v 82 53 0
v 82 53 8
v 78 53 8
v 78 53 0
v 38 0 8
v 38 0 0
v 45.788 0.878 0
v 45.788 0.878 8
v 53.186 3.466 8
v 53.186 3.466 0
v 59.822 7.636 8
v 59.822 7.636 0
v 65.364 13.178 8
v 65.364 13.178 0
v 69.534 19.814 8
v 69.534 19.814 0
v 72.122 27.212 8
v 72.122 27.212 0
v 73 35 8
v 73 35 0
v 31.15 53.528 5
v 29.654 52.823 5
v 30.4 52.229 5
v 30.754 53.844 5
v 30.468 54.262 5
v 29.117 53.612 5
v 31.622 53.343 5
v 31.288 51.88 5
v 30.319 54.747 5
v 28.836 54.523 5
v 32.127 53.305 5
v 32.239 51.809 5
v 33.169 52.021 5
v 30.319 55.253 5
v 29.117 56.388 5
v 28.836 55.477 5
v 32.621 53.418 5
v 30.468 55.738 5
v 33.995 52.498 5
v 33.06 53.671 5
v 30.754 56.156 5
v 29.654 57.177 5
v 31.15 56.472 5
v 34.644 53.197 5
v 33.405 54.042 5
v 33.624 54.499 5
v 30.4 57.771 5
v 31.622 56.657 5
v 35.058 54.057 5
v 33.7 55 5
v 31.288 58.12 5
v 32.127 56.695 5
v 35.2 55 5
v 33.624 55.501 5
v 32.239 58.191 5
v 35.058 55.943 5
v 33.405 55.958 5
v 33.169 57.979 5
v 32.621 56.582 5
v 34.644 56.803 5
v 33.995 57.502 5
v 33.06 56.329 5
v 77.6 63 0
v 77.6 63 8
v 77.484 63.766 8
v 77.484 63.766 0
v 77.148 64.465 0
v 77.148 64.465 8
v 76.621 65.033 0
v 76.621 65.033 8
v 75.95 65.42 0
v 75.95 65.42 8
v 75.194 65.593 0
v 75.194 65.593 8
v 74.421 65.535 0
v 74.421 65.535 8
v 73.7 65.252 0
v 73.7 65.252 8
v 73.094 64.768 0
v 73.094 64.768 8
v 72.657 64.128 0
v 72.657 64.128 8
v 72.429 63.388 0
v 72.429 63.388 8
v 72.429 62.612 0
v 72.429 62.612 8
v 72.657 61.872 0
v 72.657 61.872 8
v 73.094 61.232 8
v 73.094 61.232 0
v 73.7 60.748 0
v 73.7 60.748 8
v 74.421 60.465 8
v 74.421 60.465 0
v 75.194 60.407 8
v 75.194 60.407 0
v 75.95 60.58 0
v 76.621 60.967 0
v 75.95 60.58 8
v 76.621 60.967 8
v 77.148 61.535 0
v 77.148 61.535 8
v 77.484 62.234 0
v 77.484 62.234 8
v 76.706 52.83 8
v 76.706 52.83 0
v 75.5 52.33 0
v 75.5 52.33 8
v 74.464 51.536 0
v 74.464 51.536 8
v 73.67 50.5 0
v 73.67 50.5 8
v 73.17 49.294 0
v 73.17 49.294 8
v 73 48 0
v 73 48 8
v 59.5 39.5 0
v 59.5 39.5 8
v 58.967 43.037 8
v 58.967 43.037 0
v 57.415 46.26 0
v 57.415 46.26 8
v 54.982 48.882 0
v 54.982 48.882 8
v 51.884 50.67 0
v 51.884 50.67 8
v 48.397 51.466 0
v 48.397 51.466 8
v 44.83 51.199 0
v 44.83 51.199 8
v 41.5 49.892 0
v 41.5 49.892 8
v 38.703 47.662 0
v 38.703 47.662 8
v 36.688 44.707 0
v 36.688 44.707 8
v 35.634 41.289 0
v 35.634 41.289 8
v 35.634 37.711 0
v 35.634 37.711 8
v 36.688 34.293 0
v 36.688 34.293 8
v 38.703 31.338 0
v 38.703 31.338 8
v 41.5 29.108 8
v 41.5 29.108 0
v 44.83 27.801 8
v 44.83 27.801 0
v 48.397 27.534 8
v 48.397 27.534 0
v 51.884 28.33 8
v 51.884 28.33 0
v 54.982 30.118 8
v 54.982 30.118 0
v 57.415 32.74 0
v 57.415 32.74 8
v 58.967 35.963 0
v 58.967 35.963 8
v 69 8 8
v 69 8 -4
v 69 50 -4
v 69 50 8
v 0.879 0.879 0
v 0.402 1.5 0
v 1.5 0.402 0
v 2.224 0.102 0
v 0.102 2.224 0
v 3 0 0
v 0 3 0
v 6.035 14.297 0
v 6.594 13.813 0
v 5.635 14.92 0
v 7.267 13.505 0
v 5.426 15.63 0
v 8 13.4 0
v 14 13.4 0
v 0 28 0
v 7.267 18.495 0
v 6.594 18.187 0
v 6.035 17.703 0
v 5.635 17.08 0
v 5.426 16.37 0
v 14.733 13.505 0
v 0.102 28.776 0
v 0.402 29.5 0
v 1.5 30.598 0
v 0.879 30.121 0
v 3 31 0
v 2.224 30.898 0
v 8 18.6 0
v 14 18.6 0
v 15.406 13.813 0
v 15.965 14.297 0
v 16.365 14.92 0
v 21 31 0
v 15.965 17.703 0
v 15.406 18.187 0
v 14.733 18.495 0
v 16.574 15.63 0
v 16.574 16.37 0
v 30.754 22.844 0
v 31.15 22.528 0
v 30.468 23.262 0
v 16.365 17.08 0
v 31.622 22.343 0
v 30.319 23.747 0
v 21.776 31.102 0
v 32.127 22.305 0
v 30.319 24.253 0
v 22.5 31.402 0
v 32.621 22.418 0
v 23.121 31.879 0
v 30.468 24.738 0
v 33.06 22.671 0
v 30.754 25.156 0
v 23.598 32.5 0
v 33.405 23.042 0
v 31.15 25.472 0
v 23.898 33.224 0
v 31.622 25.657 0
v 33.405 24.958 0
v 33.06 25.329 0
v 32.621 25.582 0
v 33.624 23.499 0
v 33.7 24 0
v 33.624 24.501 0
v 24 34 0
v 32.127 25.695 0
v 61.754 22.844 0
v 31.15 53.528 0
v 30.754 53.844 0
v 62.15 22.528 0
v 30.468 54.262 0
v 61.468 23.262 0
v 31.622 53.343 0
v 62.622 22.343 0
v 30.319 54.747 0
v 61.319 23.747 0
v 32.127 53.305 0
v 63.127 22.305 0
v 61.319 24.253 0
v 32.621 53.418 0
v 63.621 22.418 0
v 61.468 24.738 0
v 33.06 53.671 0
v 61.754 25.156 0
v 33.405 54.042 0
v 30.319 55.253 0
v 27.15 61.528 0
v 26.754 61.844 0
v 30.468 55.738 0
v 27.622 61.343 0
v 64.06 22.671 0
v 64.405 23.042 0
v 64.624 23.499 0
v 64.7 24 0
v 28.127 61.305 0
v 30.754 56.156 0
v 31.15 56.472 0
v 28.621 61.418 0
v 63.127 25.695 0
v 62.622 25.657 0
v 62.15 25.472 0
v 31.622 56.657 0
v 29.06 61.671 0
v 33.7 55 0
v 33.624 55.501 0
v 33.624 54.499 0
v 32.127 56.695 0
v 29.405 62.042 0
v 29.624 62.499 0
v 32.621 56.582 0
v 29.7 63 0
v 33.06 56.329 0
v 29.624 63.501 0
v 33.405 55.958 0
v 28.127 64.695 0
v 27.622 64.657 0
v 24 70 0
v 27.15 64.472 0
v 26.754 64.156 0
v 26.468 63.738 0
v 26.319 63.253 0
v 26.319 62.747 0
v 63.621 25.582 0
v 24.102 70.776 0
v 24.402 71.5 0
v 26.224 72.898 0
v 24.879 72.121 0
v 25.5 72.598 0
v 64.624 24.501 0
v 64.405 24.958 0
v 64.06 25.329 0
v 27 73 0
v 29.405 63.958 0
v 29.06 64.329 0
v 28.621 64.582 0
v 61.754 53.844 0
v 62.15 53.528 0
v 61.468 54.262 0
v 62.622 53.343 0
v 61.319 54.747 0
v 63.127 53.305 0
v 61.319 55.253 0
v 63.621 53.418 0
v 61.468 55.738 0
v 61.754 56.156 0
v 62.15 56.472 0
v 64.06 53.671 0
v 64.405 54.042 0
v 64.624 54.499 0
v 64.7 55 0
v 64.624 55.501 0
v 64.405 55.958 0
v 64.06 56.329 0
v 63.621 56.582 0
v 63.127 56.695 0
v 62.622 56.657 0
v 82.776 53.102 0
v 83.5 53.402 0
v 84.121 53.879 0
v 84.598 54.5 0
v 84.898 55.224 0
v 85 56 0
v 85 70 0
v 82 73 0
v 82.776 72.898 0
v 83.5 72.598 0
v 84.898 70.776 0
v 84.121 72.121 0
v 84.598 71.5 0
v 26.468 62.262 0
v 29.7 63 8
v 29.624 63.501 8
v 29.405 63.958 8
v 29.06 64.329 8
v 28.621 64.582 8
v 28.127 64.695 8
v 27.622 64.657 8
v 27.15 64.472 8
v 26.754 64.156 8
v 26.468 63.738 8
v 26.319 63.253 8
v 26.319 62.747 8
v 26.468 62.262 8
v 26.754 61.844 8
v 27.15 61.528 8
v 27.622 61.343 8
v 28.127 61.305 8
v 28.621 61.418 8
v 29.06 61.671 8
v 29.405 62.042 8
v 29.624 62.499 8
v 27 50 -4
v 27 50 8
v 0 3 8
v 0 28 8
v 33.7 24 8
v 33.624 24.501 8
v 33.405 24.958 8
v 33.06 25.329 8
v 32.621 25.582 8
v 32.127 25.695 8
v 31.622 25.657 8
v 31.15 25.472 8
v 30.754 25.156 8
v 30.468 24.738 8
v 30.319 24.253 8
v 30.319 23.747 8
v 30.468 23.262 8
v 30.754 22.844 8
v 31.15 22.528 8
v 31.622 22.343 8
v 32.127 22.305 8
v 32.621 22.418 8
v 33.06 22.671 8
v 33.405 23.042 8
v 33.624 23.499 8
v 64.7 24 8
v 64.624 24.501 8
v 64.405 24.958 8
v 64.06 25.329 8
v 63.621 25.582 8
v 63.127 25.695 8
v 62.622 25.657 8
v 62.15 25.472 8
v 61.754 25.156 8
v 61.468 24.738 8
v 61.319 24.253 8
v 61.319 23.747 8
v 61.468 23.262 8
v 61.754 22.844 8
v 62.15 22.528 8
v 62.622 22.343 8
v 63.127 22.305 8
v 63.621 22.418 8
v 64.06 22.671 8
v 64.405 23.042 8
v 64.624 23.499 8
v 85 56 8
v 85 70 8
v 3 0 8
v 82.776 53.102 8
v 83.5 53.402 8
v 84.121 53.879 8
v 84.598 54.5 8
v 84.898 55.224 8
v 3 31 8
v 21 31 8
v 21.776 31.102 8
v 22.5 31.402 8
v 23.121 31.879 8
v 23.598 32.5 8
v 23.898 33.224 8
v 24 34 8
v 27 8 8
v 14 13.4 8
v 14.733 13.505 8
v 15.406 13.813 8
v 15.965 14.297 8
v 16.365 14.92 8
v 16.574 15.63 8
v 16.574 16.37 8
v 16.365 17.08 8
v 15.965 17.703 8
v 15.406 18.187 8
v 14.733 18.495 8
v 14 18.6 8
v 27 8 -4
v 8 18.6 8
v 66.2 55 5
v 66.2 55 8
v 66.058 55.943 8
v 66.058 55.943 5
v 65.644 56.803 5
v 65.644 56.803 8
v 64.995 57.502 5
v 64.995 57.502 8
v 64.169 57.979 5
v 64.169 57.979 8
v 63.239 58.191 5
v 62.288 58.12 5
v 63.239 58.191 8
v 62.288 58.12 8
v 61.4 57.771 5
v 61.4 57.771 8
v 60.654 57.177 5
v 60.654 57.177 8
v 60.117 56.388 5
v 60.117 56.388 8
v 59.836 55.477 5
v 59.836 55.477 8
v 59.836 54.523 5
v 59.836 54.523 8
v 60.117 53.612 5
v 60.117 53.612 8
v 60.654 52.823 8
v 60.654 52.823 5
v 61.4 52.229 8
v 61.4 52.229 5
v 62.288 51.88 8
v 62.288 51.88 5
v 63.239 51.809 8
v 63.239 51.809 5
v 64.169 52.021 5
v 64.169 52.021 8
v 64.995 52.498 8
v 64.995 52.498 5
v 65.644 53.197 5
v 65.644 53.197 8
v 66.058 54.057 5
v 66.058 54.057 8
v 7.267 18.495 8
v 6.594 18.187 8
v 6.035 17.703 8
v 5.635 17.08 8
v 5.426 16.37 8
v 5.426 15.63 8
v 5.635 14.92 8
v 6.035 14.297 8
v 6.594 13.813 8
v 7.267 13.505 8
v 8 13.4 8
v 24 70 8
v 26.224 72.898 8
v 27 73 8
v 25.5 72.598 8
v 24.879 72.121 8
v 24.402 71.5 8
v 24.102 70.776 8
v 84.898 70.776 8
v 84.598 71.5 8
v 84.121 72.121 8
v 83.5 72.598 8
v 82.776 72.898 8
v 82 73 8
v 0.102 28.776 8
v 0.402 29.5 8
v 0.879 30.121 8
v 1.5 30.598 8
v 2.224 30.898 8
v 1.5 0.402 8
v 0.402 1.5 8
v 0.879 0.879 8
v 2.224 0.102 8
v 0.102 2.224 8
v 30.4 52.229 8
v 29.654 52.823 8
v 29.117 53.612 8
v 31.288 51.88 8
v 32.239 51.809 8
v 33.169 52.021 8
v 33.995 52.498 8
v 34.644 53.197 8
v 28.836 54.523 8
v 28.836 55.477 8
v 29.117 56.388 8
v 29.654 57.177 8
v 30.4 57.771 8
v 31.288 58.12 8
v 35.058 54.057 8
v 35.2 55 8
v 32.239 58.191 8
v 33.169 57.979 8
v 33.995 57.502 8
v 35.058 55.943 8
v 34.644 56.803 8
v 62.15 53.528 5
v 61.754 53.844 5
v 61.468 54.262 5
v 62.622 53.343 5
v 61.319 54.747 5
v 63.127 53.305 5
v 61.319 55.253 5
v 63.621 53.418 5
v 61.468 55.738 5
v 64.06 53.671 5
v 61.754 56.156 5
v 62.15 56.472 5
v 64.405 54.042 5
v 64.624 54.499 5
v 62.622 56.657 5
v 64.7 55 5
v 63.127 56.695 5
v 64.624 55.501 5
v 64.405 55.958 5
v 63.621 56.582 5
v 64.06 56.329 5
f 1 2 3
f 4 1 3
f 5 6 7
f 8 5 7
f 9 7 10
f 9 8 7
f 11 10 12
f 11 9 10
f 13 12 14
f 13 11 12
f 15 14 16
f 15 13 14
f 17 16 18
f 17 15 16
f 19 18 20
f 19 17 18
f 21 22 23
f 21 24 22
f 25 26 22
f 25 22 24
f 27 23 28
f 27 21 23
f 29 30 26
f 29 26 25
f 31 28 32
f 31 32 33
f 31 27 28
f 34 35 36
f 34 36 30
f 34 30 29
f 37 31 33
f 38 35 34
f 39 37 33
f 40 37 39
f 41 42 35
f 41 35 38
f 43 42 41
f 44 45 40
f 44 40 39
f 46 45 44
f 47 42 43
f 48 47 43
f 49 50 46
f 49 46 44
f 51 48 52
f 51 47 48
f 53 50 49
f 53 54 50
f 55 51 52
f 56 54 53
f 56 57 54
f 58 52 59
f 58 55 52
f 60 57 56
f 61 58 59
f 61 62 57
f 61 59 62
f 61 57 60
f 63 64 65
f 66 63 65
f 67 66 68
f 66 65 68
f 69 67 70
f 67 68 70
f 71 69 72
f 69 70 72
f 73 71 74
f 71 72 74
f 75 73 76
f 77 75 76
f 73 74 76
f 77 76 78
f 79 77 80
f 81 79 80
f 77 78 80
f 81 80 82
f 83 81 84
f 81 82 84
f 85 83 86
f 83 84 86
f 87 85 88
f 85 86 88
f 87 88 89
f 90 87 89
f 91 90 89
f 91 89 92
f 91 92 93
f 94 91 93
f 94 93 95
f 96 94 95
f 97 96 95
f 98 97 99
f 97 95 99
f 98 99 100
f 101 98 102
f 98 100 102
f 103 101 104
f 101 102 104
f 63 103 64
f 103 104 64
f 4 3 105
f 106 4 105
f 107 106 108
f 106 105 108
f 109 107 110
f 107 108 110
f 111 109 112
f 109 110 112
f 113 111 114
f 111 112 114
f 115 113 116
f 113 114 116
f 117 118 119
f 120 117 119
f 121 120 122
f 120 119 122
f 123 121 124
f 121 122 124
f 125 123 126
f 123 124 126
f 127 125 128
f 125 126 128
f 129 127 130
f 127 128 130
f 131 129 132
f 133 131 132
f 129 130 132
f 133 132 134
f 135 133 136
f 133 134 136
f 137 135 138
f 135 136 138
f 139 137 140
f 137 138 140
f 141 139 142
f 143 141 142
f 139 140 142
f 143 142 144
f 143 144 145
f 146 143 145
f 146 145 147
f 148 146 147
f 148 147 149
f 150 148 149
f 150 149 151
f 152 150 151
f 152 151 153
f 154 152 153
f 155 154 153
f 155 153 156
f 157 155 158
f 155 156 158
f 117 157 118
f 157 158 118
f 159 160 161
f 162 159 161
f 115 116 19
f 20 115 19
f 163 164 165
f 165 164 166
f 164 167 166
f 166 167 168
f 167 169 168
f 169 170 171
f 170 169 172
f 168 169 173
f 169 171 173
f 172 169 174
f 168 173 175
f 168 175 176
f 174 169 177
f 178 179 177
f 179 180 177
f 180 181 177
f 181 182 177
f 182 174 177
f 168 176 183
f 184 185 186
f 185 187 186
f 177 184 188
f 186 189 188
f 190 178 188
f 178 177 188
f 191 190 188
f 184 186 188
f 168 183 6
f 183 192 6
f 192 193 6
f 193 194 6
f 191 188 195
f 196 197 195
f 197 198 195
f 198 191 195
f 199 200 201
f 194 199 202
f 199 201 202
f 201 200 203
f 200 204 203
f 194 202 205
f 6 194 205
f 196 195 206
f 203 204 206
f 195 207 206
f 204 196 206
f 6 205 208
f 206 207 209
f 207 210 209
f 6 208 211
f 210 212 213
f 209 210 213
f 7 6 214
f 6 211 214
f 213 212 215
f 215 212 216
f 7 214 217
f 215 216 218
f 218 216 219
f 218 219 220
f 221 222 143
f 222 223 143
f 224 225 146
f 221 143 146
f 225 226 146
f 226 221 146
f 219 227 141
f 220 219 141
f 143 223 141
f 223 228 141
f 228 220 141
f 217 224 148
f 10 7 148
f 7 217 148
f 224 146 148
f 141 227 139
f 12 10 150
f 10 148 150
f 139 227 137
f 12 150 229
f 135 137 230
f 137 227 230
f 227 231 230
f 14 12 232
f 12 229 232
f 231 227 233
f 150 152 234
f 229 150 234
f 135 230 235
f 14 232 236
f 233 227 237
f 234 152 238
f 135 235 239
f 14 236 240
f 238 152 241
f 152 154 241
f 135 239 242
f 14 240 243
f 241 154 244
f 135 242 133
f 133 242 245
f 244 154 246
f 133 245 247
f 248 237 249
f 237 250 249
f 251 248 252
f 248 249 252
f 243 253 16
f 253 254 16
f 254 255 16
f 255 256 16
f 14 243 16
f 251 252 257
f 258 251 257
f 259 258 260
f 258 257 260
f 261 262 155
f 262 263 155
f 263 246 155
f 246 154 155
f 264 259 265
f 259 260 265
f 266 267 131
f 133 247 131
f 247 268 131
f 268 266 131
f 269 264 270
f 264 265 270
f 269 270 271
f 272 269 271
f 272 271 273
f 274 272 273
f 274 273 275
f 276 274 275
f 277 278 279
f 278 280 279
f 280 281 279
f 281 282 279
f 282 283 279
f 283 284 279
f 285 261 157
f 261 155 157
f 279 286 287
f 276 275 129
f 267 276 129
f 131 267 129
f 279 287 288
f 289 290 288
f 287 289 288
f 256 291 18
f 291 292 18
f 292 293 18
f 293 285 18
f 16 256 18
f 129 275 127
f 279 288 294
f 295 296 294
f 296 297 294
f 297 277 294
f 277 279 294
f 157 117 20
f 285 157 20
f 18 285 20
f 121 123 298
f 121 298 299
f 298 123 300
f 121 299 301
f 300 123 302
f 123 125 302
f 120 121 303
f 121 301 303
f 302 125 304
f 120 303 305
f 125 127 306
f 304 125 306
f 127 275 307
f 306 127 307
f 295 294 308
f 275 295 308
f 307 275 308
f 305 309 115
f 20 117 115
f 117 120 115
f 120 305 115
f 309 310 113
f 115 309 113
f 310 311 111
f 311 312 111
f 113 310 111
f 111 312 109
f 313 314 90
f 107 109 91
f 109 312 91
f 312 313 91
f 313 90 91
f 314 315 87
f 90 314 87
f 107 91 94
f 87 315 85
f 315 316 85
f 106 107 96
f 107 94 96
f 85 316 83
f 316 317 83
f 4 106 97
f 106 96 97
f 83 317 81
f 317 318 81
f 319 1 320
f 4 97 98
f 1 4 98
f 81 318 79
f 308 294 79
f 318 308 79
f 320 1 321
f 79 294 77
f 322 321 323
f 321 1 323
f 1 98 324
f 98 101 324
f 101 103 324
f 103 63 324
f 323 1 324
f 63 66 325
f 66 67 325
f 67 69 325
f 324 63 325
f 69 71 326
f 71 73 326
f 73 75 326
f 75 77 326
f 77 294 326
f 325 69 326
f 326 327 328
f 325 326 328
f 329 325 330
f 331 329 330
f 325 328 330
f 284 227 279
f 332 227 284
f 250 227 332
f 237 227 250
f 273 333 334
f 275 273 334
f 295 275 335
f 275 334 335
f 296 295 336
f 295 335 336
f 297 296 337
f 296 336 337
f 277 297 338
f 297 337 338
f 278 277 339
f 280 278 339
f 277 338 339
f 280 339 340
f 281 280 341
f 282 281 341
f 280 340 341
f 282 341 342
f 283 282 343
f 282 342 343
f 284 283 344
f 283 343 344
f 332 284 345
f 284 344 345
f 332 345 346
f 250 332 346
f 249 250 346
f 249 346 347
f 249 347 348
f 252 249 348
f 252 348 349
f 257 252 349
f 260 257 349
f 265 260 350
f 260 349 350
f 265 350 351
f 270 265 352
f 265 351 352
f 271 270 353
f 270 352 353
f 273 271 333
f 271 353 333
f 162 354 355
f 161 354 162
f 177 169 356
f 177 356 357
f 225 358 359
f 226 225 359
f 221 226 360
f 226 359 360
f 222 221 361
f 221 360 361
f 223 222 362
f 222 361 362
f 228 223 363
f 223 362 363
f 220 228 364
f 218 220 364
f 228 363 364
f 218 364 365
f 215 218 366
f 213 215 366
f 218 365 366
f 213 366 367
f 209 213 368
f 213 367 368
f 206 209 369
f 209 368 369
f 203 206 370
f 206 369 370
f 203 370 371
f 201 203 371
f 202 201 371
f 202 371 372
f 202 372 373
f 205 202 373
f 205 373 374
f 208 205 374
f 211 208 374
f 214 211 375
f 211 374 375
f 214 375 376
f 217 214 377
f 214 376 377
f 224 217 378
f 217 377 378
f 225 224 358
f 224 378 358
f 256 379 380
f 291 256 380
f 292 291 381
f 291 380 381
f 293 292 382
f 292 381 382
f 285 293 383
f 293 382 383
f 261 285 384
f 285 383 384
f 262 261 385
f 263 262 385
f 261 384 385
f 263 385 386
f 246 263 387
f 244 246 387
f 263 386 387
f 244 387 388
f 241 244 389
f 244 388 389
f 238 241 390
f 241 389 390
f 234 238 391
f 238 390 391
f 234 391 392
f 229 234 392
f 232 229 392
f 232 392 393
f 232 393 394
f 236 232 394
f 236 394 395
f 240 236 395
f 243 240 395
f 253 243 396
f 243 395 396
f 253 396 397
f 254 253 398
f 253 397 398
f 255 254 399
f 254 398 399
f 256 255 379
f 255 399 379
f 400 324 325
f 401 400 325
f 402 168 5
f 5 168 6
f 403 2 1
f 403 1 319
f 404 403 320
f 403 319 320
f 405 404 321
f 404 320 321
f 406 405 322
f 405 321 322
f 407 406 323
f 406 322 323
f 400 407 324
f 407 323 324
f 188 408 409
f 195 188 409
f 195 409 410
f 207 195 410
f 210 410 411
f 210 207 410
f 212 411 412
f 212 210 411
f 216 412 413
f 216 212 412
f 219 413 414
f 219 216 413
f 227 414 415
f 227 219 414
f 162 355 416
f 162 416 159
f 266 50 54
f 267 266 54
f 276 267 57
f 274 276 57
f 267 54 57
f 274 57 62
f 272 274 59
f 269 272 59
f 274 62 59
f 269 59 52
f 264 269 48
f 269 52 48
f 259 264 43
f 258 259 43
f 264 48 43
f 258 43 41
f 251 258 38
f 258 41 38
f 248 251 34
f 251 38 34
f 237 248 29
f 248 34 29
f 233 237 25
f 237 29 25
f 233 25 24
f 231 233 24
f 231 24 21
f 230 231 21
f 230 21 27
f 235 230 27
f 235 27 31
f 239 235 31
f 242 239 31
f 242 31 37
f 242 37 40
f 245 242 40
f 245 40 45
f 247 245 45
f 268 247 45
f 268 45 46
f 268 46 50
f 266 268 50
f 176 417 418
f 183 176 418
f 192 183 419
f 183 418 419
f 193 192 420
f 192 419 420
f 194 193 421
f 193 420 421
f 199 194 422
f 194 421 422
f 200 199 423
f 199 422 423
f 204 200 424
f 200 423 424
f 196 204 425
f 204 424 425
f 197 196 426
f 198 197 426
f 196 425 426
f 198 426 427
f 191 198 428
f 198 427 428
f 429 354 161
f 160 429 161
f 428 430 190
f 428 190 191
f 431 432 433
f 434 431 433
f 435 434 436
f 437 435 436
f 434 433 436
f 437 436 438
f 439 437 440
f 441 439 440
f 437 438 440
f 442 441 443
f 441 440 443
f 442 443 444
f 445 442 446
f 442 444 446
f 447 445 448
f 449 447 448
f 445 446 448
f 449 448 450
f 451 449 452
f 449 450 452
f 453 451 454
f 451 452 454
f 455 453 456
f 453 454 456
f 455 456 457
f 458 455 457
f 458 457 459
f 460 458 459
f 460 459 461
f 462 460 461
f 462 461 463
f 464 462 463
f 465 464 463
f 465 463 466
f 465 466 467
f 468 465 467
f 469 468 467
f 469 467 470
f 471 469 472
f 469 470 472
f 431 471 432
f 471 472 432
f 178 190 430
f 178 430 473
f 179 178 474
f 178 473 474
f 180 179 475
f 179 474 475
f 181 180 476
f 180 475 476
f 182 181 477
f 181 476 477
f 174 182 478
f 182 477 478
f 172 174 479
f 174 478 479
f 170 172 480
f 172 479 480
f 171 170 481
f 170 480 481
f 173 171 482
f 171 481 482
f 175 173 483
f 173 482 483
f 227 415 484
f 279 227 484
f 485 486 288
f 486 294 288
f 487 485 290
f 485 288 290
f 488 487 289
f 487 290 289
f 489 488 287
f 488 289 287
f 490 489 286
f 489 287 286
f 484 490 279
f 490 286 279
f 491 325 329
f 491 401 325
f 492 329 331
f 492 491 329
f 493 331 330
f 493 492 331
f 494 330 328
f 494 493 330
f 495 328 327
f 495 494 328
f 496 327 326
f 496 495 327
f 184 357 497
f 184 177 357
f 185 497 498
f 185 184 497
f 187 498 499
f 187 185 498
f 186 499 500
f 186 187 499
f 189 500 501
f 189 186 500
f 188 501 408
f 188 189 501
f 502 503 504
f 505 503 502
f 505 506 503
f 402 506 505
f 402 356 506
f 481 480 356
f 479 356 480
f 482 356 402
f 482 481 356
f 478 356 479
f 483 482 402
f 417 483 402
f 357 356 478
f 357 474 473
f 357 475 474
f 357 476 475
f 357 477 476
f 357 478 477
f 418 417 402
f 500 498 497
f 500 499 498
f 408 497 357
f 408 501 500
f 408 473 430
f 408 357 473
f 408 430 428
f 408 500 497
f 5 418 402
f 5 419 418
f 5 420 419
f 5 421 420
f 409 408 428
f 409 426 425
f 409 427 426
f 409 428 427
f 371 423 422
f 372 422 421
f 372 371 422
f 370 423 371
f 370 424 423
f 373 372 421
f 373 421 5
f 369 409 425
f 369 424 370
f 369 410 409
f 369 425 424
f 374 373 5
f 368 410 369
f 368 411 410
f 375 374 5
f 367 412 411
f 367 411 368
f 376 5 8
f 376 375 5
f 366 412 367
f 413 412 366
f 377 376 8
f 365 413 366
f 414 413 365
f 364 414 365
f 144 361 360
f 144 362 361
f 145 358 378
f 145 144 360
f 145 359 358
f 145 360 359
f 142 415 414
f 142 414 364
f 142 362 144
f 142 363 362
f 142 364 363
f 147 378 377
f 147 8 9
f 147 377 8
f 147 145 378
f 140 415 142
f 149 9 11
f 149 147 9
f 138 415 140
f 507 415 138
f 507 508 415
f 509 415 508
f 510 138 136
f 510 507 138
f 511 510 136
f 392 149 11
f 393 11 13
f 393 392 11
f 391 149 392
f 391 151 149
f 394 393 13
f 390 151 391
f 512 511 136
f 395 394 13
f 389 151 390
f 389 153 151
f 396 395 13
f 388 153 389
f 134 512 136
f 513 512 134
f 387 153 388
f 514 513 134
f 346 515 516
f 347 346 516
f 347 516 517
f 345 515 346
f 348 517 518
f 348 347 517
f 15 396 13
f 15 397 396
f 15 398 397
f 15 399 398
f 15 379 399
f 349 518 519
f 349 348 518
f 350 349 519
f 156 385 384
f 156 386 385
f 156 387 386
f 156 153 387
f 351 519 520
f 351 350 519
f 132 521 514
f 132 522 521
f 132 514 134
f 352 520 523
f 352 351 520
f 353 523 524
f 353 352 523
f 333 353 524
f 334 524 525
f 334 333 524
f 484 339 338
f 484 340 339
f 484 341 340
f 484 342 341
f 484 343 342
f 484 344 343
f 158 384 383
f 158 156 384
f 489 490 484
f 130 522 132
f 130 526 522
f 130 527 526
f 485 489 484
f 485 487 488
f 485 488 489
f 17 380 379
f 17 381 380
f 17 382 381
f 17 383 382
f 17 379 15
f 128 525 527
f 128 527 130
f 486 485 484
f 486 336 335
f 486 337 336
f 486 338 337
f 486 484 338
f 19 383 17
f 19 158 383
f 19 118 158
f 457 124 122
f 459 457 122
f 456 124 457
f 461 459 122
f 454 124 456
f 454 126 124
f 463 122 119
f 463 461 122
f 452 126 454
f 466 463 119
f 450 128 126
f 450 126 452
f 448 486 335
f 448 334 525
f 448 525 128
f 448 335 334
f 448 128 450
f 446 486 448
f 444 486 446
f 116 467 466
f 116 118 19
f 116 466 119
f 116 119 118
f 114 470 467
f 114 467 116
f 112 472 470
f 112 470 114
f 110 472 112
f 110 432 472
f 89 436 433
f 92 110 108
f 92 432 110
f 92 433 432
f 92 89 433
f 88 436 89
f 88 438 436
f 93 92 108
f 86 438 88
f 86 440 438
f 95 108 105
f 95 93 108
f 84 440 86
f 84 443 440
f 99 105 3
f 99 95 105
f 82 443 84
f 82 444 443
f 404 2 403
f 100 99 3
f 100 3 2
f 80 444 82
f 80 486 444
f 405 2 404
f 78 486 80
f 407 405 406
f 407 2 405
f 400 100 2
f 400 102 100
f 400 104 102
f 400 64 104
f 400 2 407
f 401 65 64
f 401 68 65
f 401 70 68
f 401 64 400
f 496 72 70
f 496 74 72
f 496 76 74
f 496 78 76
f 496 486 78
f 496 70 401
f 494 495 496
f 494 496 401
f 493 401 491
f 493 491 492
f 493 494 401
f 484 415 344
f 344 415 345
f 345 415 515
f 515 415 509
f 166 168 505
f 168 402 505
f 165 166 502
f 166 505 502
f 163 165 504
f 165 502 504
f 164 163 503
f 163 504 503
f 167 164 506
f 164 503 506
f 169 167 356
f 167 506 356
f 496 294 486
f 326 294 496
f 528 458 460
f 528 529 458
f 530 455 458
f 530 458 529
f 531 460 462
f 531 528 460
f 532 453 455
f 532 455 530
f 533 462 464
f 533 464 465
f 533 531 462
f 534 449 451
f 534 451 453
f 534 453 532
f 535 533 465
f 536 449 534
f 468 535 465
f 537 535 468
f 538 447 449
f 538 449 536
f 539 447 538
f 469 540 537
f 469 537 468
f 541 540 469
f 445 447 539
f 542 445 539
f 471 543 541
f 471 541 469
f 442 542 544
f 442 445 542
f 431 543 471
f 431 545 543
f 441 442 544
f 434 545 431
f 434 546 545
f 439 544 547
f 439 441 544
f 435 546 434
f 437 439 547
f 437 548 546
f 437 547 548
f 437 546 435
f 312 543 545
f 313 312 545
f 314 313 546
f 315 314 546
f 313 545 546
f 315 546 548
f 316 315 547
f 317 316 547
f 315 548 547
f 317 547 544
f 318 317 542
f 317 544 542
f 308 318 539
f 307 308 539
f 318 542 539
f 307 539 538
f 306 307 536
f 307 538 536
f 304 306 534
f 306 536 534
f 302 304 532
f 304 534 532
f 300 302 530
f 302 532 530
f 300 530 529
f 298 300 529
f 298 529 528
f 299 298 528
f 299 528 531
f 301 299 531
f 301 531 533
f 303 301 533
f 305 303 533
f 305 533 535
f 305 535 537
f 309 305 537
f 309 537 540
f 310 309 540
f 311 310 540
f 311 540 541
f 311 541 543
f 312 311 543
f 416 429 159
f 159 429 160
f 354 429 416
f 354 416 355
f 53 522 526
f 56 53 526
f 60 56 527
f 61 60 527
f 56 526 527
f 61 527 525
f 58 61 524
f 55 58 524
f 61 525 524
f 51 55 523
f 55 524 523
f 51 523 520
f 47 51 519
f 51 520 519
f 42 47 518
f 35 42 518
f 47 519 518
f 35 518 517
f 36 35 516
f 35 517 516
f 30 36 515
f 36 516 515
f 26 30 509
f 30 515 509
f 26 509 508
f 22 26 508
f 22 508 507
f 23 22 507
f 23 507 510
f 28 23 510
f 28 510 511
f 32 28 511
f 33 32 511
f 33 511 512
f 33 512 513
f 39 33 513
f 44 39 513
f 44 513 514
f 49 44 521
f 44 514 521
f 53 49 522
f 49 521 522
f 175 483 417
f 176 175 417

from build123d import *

# Parameters (mm, degrees)
BOX001_W        = 42
BOX001_H        = 42
BOX001_DEPTH    = 12
BOX_W           = 85
BOX_H           = 73
BOX_DEPTH       = 8
SKETCH_R        = 1.7
SKETCH_R_2      = 12
SKETCH_R_3      = 2.6
SKETCH_W        = 24
SKETCH_H        = 42
POCKET_DEPTH    = 8
SKETCH001_R     = 3.2
POCKET001_DEPTH = 3
FILLET_R        = 35
FILLET001_R     = 3


with BuildPart() as nema:
    # Box001 → Box001 (new body)
    with BuildSketch(Plane(origin=(27, 8, -4), x_dir=(1, 0, 0), z_dir=(0, 0, 1))):
        with Locations((21, 21)):
            Rectangle(BOX001_W, BOX001_H)
    extrude(amount=BOX001_DEPTH)


with BuildPart() as fillet001:
    # Box → Box (new body)
    with BuildSketch(Plane.XY):
        with Locations((42.5, 36.5)):
            Rectangle(BOX_W, BOX_H)
    extrude(amount=BOX_DEPTH)

    # Sketch → Pocket (cut)
    with BuildSketch(Plane.XY.offset(8)):
        with Locations((32, 55)):
            Circle(SKETCH_R)
        with Locations((63, 55)):
            Circle(SKETCH_R)
        with Locations((63, 24)):
            Circle(SKETCH_R)
        with Locations((32, 24)):
            Circle(SKETCH_R)
        with Locations((47.5, 39.5)):
            Circle(SKETCH_R_2)
        with Locations((28, 63)):
            Circle(SKETCH_R)
        with Locations((75, 63)):
            Circle(SKETCH_R_3)
        with Locations((12, 52)):
            Rectangle(SKETCH_W, SKETCH_H)
        with BuildLine():
            ThreePointArc((8, 18.6), (5.4, 16), (8, 13.4))
            Line((8, 13.4), (14, 13.4))
            ThreePointArc((14, 13.4), (16.6, 16), (14, 18.6))
            Line((8, 18.6), (14, 18.6))
        make_face()
        with BuildLine():
            Line((96.2, 53), (78, 53))
            ThreePointArc((78, 53), (74.464466, 51.535534), (73, 48))
            Line((73, 48), (73, -12.2))
            Line((73, -12.2), (96.2, -12.2))
            Line((96.2, -12.2), (96.2, 53))
        make_face()
    extrude(amount=-POCKET_DEPTH, mode=Mode.SUBTRACT)

    # Sketch001 → Pocket001 (cut)
    with BuildSketch(Plane.XY.offset(8)):
        with Locations((32, 55)):
            Circle(SKETCH001_R)
        with Locations((63, 55)):
            Circle(SKETCH001_R)
    extrude(amount=-POCKET001_DEPTH, mode=Mode.SUBTRACT)

    # Fillet
    fillet_edges = [fillet001.edges().sort_by_distance(p)[0] for p in [
        (73, 0, 4),
    ]]
    fillet(fillet_edges, radius=FILLET_R)

    # Fillet001
    fillet001_edges = [fillet001.edges().sort_by_distance(p)[0] for p in [
        (24, 31, 4),
        (0, 31, 4),
        (0, 0, 4),
        (24, 73, 4),
        (85, 73, 4),
        (85, 53, 4),
    ]]
    fillet(fillet001_edges, radius=FILLET001_R)


solid = Compound([nema.part, fillet001.part])
